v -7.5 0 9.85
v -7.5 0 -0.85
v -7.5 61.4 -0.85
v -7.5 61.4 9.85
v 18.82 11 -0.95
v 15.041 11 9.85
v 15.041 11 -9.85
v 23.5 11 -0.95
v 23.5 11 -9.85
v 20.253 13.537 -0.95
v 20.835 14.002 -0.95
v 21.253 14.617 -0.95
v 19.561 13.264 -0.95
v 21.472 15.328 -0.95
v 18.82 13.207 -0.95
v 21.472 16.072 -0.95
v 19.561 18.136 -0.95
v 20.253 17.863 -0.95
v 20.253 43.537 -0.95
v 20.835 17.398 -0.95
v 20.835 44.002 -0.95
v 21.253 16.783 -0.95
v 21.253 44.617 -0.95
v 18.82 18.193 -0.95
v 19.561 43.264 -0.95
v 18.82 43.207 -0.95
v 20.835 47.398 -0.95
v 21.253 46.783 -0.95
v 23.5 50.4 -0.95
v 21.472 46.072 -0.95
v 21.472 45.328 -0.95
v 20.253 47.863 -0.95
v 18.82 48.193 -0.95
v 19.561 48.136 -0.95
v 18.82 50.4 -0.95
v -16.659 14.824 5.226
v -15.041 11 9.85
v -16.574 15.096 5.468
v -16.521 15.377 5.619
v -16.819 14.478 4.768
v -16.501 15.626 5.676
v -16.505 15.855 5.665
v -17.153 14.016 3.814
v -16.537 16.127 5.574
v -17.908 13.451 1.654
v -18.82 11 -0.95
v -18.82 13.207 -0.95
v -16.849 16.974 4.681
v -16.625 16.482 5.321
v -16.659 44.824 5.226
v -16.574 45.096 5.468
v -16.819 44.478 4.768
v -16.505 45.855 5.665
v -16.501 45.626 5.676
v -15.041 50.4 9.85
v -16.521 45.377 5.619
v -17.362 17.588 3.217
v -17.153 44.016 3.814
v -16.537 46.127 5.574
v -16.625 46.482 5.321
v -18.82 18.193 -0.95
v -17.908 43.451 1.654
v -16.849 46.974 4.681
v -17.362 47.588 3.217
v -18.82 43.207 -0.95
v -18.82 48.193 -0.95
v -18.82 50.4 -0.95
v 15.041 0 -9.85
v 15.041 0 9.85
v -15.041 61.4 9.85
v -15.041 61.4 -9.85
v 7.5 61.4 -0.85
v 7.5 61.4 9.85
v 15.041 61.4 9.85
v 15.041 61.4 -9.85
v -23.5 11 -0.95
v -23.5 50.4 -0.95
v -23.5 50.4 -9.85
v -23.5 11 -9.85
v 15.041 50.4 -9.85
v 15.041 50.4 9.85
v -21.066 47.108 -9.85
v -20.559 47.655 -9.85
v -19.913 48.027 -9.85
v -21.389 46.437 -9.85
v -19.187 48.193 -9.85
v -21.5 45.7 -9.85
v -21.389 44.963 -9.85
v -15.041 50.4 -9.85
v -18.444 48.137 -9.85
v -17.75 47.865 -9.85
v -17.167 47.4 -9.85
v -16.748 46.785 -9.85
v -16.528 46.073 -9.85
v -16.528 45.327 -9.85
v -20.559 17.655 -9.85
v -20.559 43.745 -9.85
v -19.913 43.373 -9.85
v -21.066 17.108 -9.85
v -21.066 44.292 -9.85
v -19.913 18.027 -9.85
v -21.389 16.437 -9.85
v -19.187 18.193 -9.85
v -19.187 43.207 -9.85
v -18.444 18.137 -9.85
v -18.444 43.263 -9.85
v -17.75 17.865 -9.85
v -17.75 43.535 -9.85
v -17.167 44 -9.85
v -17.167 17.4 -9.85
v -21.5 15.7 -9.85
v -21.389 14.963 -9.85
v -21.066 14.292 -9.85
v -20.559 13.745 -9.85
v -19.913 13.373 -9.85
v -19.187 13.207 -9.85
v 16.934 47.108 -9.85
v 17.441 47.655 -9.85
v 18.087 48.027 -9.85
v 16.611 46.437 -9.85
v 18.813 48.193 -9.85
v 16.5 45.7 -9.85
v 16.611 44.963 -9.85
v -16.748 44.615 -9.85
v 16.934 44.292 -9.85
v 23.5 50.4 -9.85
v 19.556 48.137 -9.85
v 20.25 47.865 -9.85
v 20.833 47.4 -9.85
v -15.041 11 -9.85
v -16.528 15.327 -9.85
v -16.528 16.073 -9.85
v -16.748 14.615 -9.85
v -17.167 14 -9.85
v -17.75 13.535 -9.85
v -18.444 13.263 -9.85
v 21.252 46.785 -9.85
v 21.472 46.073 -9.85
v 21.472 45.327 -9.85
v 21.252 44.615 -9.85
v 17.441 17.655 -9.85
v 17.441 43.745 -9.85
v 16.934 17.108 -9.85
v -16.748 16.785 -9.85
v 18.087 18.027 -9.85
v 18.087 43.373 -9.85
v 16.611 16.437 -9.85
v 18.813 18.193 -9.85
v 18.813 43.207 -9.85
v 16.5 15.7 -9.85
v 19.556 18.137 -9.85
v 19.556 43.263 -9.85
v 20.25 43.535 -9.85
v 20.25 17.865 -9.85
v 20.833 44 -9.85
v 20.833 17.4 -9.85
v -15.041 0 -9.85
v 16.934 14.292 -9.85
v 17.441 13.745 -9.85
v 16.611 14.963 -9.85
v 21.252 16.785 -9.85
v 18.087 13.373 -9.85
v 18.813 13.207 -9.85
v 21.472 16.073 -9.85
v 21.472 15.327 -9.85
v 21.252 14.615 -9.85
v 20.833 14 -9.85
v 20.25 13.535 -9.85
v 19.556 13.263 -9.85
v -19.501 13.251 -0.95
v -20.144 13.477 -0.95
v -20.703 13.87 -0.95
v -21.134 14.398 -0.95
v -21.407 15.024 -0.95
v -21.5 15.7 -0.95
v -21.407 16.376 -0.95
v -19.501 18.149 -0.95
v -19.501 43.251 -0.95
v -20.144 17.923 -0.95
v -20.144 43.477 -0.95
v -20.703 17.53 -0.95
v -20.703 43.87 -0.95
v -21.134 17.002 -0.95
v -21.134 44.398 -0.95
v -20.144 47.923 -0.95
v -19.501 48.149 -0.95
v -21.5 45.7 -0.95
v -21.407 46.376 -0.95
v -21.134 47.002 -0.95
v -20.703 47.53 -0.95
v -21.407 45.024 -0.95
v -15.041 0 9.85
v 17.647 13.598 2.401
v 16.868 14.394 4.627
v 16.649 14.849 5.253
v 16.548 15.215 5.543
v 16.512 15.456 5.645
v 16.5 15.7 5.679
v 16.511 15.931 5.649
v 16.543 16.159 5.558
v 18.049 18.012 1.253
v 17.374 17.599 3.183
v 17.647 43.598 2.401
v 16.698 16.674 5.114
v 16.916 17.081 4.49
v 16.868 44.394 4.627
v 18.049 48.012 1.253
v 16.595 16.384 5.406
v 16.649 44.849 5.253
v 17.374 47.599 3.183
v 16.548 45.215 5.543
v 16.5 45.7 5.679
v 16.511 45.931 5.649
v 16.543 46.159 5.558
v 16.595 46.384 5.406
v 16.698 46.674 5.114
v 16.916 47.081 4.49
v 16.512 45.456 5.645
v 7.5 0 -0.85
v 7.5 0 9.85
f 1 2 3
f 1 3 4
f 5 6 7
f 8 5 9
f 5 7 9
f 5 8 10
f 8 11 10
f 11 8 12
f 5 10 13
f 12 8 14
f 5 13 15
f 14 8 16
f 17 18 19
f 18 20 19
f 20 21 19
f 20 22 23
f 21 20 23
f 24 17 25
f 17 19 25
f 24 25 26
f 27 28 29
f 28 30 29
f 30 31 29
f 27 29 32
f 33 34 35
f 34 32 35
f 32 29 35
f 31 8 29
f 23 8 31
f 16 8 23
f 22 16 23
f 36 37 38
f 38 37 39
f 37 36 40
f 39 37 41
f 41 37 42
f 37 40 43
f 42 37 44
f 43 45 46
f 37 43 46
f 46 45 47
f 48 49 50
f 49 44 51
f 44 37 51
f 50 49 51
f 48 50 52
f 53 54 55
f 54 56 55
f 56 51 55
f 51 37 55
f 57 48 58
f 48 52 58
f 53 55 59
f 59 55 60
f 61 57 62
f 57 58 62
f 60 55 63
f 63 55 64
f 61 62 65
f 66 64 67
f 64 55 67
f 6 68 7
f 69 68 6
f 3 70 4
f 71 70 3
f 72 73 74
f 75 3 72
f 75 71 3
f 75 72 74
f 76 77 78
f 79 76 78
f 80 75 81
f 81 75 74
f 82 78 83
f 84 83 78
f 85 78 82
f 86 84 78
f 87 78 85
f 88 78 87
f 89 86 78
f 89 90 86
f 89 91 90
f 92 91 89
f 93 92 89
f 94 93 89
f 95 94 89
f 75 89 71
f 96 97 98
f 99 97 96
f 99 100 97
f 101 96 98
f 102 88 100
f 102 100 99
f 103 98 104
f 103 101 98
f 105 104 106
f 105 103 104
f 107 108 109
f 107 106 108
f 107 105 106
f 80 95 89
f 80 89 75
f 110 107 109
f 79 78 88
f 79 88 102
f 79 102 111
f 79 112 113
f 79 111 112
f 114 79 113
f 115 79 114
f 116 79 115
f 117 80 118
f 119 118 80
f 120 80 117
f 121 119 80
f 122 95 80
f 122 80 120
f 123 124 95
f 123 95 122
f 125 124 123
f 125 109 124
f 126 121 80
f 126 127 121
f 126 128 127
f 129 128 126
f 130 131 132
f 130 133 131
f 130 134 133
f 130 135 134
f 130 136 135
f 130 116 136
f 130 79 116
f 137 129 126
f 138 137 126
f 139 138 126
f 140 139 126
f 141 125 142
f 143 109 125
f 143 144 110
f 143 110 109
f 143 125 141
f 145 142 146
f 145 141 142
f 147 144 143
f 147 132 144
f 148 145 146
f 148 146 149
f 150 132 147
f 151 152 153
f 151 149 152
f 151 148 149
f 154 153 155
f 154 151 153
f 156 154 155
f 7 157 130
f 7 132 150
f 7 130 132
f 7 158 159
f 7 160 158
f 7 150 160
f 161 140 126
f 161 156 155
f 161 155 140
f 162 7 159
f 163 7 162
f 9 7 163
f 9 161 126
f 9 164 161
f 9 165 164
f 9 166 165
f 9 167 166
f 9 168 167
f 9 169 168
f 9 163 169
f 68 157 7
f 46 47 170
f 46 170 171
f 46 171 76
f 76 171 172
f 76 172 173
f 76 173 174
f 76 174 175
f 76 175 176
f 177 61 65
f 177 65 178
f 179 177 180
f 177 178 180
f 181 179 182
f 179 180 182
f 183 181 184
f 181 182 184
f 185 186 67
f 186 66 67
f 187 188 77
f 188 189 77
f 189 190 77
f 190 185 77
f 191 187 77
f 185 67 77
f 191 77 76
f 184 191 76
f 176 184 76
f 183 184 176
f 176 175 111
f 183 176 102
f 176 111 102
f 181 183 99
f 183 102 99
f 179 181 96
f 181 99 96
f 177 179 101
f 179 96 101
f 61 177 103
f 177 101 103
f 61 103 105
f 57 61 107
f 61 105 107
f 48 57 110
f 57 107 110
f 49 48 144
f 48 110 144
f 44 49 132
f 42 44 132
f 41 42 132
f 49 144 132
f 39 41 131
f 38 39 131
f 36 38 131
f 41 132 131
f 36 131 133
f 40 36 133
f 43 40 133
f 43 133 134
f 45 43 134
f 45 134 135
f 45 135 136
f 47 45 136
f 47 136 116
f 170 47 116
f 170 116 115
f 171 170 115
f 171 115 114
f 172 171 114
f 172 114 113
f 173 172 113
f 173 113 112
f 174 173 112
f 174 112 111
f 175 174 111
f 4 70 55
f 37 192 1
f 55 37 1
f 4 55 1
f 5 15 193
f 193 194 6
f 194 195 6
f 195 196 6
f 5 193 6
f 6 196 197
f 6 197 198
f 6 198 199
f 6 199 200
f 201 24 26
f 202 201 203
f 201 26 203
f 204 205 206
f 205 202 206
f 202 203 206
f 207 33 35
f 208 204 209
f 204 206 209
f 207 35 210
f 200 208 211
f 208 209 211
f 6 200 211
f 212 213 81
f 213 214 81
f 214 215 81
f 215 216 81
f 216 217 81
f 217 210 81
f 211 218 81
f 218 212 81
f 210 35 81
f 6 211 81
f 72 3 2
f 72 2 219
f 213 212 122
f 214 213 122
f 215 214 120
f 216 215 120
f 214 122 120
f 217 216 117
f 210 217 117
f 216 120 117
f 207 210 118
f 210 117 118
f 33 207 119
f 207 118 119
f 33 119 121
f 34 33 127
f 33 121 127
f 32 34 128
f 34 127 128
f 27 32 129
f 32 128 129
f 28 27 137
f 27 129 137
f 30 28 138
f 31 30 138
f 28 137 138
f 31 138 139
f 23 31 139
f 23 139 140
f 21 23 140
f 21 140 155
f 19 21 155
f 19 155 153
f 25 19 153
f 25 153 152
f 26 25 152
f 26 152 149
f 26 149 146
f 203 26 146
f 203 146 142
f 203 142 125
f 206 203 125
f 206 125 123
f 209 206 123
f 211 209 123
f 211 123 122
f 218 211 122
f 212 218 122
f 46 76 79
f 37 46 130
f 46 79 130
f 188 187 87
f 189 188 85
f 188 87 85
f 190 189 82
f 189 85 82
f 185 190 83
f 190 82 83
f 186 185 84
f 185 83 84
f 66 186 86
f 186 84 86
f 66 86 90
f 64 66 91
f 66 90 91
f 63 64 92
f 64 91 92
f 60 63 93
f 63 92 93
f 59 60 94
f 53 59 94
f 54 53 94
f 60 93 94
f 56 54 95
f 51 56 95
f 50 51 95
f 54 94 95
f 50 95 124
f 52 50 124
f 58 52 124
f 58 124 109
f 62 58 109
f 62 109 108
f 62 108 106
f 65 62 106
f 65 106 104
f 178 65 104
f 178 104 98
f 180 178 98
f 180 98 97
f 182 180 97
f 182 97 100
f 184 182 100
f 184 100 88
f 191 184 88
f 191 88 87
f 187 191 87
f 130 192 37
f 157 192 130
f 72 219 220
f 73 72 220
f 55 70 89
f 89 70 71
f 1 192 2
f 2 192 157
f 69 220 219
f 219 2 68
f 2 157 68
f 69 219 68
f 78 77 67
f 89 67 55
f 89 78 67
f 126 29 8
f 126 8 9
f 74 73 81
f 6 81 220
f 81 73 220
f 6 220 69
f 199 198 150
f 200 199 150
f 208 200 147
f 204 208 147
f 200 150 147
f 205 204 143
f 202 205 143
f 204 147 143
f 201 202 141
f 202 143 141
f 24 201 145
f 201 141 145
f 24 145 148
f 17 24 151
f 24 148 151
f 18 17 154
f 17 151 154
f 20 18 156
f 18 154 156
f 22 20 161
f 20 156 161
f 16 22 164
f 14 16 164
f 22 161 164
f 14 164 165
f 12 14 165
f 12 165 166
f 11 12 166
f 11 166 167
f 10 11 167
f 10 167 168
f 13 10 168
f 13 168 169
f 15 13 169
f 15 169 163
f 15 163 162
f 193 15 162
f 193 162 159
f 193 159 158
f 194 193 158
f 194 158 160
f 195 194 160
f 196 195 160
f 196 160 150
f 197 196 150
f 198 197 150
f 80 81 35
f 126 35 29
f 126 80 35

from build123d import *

# Parameters (mm, degrees)
SKETCH_5_W          = 47
SKETCH_5_H          = 19.7
EXTRUDE_3_DEPTH     = 61.4
CUT_EXTRUDE_1_DEPTH = 62.4
CUT_EXTRUDE_2_DEPTH = 11
SKETCH_8_R          = 2.5
CUT_EXTRUDE_3_DEPTH = 33
SKETCH_9_W          = 15
SKETCH_9_H          = 21.981640809
CUT_EXTRUDE_4_DEPTH = 73


with BuildPart() as part:
    # 草图5 → 凸台-拉伸3 (new body)
    with BuildSketch(Plane(origin=(0, 0, 0), x_dir=(1, 0, 0), z_dir=(0, 1, 0))):
        Rectangle(SKETCH_5_W, SKETCH_5_H)
    extrude(amount=EXTRUDE_3_DEPTH)

    # 草图6 → 切除-拉伸1 (cut, through all)
    with BuildSketch(Plane(origin=(0, 61.4, 0), x_dir=(1, 0, 0), z_dir=(0, 1, 0))):
        Polygon((-18.819510237, 0.95), (-23.5, 0.95), (-23.5, -9.85), (-15.040666545, -9.85), align=None)
        Polygon((18.819510237, 0.95), (15.040666545, -9.85), (23.5, -9.85), (23.5, 0.95), align=None)
    extrude(amount=-CUT_EXTRUDE_1_DEPTH, mode=Mode.SUBTRACT)

    # 草图6<6> → 切除-拉伸2 (cut)
    with BuildSketch(Plane(origin=(0, 61.4, 0), x_dir=(1, 0, 0), z_dir=(0, 1, 0))):
        Polygon((-19, 9.85), (-23.5, 9.85), (-23.5, 0.95), (-18.819510237, 0.95), (-15.040666545, -9.85), (-15.040666545, 9.85), align=None)
        Polygon((19, 9.85), (15.040666545, 9.85), (15.040666545, -9.85), (18.819510237, 0.95), (23.5, 0.95), (23.5, 9.85), align=None)
    cut_extrude_2 = extrude(amount=-CUT_EXTRUDE_2_DEPTH, mode=Mode.SUBTRACT)

    # 镜向1: 切除-拉伸2 across plane
    add(cut_extrude_2.mirror(Plane.ZX.offset(30.7)), mode=Mode.SUBTRACT)

    # 草图8 → 切除-拉伸3 (cut)
    with BuildSketch(Plane(origin=(0, 0, -9.85), x_dir=(-1, 0, 0), z_dir=(0, 0, -1))):
        with Locations((-19, 15.7)):
            Circle(SKETCH_8_R)
        with Locations((19, 15.7)):
            Circle(SKETCH_8_R)
        with Locations((19, 45.7)):
            Circle(SKETCH_8_R)
        with Locations((-19, 45.7)):
            Circle(SKETCH_8_R)
    extrude(amount=-CUT_EXTRUDE_3_DEPTH, mode=Mode.SUBTRACT)

    # 草图9 → 切除-拉伸4 (cut)
    with BuildSketch(Plane.XZ):
        with Locations((0, 10.140820404)):
            Rectangle(SKETCH_9_W, SKETCH_9_H)
    extrude(amount=-CUT_EXTRUDE_4_DEPTH, mode=Mode.SUBTRACT)


solid = part.part
